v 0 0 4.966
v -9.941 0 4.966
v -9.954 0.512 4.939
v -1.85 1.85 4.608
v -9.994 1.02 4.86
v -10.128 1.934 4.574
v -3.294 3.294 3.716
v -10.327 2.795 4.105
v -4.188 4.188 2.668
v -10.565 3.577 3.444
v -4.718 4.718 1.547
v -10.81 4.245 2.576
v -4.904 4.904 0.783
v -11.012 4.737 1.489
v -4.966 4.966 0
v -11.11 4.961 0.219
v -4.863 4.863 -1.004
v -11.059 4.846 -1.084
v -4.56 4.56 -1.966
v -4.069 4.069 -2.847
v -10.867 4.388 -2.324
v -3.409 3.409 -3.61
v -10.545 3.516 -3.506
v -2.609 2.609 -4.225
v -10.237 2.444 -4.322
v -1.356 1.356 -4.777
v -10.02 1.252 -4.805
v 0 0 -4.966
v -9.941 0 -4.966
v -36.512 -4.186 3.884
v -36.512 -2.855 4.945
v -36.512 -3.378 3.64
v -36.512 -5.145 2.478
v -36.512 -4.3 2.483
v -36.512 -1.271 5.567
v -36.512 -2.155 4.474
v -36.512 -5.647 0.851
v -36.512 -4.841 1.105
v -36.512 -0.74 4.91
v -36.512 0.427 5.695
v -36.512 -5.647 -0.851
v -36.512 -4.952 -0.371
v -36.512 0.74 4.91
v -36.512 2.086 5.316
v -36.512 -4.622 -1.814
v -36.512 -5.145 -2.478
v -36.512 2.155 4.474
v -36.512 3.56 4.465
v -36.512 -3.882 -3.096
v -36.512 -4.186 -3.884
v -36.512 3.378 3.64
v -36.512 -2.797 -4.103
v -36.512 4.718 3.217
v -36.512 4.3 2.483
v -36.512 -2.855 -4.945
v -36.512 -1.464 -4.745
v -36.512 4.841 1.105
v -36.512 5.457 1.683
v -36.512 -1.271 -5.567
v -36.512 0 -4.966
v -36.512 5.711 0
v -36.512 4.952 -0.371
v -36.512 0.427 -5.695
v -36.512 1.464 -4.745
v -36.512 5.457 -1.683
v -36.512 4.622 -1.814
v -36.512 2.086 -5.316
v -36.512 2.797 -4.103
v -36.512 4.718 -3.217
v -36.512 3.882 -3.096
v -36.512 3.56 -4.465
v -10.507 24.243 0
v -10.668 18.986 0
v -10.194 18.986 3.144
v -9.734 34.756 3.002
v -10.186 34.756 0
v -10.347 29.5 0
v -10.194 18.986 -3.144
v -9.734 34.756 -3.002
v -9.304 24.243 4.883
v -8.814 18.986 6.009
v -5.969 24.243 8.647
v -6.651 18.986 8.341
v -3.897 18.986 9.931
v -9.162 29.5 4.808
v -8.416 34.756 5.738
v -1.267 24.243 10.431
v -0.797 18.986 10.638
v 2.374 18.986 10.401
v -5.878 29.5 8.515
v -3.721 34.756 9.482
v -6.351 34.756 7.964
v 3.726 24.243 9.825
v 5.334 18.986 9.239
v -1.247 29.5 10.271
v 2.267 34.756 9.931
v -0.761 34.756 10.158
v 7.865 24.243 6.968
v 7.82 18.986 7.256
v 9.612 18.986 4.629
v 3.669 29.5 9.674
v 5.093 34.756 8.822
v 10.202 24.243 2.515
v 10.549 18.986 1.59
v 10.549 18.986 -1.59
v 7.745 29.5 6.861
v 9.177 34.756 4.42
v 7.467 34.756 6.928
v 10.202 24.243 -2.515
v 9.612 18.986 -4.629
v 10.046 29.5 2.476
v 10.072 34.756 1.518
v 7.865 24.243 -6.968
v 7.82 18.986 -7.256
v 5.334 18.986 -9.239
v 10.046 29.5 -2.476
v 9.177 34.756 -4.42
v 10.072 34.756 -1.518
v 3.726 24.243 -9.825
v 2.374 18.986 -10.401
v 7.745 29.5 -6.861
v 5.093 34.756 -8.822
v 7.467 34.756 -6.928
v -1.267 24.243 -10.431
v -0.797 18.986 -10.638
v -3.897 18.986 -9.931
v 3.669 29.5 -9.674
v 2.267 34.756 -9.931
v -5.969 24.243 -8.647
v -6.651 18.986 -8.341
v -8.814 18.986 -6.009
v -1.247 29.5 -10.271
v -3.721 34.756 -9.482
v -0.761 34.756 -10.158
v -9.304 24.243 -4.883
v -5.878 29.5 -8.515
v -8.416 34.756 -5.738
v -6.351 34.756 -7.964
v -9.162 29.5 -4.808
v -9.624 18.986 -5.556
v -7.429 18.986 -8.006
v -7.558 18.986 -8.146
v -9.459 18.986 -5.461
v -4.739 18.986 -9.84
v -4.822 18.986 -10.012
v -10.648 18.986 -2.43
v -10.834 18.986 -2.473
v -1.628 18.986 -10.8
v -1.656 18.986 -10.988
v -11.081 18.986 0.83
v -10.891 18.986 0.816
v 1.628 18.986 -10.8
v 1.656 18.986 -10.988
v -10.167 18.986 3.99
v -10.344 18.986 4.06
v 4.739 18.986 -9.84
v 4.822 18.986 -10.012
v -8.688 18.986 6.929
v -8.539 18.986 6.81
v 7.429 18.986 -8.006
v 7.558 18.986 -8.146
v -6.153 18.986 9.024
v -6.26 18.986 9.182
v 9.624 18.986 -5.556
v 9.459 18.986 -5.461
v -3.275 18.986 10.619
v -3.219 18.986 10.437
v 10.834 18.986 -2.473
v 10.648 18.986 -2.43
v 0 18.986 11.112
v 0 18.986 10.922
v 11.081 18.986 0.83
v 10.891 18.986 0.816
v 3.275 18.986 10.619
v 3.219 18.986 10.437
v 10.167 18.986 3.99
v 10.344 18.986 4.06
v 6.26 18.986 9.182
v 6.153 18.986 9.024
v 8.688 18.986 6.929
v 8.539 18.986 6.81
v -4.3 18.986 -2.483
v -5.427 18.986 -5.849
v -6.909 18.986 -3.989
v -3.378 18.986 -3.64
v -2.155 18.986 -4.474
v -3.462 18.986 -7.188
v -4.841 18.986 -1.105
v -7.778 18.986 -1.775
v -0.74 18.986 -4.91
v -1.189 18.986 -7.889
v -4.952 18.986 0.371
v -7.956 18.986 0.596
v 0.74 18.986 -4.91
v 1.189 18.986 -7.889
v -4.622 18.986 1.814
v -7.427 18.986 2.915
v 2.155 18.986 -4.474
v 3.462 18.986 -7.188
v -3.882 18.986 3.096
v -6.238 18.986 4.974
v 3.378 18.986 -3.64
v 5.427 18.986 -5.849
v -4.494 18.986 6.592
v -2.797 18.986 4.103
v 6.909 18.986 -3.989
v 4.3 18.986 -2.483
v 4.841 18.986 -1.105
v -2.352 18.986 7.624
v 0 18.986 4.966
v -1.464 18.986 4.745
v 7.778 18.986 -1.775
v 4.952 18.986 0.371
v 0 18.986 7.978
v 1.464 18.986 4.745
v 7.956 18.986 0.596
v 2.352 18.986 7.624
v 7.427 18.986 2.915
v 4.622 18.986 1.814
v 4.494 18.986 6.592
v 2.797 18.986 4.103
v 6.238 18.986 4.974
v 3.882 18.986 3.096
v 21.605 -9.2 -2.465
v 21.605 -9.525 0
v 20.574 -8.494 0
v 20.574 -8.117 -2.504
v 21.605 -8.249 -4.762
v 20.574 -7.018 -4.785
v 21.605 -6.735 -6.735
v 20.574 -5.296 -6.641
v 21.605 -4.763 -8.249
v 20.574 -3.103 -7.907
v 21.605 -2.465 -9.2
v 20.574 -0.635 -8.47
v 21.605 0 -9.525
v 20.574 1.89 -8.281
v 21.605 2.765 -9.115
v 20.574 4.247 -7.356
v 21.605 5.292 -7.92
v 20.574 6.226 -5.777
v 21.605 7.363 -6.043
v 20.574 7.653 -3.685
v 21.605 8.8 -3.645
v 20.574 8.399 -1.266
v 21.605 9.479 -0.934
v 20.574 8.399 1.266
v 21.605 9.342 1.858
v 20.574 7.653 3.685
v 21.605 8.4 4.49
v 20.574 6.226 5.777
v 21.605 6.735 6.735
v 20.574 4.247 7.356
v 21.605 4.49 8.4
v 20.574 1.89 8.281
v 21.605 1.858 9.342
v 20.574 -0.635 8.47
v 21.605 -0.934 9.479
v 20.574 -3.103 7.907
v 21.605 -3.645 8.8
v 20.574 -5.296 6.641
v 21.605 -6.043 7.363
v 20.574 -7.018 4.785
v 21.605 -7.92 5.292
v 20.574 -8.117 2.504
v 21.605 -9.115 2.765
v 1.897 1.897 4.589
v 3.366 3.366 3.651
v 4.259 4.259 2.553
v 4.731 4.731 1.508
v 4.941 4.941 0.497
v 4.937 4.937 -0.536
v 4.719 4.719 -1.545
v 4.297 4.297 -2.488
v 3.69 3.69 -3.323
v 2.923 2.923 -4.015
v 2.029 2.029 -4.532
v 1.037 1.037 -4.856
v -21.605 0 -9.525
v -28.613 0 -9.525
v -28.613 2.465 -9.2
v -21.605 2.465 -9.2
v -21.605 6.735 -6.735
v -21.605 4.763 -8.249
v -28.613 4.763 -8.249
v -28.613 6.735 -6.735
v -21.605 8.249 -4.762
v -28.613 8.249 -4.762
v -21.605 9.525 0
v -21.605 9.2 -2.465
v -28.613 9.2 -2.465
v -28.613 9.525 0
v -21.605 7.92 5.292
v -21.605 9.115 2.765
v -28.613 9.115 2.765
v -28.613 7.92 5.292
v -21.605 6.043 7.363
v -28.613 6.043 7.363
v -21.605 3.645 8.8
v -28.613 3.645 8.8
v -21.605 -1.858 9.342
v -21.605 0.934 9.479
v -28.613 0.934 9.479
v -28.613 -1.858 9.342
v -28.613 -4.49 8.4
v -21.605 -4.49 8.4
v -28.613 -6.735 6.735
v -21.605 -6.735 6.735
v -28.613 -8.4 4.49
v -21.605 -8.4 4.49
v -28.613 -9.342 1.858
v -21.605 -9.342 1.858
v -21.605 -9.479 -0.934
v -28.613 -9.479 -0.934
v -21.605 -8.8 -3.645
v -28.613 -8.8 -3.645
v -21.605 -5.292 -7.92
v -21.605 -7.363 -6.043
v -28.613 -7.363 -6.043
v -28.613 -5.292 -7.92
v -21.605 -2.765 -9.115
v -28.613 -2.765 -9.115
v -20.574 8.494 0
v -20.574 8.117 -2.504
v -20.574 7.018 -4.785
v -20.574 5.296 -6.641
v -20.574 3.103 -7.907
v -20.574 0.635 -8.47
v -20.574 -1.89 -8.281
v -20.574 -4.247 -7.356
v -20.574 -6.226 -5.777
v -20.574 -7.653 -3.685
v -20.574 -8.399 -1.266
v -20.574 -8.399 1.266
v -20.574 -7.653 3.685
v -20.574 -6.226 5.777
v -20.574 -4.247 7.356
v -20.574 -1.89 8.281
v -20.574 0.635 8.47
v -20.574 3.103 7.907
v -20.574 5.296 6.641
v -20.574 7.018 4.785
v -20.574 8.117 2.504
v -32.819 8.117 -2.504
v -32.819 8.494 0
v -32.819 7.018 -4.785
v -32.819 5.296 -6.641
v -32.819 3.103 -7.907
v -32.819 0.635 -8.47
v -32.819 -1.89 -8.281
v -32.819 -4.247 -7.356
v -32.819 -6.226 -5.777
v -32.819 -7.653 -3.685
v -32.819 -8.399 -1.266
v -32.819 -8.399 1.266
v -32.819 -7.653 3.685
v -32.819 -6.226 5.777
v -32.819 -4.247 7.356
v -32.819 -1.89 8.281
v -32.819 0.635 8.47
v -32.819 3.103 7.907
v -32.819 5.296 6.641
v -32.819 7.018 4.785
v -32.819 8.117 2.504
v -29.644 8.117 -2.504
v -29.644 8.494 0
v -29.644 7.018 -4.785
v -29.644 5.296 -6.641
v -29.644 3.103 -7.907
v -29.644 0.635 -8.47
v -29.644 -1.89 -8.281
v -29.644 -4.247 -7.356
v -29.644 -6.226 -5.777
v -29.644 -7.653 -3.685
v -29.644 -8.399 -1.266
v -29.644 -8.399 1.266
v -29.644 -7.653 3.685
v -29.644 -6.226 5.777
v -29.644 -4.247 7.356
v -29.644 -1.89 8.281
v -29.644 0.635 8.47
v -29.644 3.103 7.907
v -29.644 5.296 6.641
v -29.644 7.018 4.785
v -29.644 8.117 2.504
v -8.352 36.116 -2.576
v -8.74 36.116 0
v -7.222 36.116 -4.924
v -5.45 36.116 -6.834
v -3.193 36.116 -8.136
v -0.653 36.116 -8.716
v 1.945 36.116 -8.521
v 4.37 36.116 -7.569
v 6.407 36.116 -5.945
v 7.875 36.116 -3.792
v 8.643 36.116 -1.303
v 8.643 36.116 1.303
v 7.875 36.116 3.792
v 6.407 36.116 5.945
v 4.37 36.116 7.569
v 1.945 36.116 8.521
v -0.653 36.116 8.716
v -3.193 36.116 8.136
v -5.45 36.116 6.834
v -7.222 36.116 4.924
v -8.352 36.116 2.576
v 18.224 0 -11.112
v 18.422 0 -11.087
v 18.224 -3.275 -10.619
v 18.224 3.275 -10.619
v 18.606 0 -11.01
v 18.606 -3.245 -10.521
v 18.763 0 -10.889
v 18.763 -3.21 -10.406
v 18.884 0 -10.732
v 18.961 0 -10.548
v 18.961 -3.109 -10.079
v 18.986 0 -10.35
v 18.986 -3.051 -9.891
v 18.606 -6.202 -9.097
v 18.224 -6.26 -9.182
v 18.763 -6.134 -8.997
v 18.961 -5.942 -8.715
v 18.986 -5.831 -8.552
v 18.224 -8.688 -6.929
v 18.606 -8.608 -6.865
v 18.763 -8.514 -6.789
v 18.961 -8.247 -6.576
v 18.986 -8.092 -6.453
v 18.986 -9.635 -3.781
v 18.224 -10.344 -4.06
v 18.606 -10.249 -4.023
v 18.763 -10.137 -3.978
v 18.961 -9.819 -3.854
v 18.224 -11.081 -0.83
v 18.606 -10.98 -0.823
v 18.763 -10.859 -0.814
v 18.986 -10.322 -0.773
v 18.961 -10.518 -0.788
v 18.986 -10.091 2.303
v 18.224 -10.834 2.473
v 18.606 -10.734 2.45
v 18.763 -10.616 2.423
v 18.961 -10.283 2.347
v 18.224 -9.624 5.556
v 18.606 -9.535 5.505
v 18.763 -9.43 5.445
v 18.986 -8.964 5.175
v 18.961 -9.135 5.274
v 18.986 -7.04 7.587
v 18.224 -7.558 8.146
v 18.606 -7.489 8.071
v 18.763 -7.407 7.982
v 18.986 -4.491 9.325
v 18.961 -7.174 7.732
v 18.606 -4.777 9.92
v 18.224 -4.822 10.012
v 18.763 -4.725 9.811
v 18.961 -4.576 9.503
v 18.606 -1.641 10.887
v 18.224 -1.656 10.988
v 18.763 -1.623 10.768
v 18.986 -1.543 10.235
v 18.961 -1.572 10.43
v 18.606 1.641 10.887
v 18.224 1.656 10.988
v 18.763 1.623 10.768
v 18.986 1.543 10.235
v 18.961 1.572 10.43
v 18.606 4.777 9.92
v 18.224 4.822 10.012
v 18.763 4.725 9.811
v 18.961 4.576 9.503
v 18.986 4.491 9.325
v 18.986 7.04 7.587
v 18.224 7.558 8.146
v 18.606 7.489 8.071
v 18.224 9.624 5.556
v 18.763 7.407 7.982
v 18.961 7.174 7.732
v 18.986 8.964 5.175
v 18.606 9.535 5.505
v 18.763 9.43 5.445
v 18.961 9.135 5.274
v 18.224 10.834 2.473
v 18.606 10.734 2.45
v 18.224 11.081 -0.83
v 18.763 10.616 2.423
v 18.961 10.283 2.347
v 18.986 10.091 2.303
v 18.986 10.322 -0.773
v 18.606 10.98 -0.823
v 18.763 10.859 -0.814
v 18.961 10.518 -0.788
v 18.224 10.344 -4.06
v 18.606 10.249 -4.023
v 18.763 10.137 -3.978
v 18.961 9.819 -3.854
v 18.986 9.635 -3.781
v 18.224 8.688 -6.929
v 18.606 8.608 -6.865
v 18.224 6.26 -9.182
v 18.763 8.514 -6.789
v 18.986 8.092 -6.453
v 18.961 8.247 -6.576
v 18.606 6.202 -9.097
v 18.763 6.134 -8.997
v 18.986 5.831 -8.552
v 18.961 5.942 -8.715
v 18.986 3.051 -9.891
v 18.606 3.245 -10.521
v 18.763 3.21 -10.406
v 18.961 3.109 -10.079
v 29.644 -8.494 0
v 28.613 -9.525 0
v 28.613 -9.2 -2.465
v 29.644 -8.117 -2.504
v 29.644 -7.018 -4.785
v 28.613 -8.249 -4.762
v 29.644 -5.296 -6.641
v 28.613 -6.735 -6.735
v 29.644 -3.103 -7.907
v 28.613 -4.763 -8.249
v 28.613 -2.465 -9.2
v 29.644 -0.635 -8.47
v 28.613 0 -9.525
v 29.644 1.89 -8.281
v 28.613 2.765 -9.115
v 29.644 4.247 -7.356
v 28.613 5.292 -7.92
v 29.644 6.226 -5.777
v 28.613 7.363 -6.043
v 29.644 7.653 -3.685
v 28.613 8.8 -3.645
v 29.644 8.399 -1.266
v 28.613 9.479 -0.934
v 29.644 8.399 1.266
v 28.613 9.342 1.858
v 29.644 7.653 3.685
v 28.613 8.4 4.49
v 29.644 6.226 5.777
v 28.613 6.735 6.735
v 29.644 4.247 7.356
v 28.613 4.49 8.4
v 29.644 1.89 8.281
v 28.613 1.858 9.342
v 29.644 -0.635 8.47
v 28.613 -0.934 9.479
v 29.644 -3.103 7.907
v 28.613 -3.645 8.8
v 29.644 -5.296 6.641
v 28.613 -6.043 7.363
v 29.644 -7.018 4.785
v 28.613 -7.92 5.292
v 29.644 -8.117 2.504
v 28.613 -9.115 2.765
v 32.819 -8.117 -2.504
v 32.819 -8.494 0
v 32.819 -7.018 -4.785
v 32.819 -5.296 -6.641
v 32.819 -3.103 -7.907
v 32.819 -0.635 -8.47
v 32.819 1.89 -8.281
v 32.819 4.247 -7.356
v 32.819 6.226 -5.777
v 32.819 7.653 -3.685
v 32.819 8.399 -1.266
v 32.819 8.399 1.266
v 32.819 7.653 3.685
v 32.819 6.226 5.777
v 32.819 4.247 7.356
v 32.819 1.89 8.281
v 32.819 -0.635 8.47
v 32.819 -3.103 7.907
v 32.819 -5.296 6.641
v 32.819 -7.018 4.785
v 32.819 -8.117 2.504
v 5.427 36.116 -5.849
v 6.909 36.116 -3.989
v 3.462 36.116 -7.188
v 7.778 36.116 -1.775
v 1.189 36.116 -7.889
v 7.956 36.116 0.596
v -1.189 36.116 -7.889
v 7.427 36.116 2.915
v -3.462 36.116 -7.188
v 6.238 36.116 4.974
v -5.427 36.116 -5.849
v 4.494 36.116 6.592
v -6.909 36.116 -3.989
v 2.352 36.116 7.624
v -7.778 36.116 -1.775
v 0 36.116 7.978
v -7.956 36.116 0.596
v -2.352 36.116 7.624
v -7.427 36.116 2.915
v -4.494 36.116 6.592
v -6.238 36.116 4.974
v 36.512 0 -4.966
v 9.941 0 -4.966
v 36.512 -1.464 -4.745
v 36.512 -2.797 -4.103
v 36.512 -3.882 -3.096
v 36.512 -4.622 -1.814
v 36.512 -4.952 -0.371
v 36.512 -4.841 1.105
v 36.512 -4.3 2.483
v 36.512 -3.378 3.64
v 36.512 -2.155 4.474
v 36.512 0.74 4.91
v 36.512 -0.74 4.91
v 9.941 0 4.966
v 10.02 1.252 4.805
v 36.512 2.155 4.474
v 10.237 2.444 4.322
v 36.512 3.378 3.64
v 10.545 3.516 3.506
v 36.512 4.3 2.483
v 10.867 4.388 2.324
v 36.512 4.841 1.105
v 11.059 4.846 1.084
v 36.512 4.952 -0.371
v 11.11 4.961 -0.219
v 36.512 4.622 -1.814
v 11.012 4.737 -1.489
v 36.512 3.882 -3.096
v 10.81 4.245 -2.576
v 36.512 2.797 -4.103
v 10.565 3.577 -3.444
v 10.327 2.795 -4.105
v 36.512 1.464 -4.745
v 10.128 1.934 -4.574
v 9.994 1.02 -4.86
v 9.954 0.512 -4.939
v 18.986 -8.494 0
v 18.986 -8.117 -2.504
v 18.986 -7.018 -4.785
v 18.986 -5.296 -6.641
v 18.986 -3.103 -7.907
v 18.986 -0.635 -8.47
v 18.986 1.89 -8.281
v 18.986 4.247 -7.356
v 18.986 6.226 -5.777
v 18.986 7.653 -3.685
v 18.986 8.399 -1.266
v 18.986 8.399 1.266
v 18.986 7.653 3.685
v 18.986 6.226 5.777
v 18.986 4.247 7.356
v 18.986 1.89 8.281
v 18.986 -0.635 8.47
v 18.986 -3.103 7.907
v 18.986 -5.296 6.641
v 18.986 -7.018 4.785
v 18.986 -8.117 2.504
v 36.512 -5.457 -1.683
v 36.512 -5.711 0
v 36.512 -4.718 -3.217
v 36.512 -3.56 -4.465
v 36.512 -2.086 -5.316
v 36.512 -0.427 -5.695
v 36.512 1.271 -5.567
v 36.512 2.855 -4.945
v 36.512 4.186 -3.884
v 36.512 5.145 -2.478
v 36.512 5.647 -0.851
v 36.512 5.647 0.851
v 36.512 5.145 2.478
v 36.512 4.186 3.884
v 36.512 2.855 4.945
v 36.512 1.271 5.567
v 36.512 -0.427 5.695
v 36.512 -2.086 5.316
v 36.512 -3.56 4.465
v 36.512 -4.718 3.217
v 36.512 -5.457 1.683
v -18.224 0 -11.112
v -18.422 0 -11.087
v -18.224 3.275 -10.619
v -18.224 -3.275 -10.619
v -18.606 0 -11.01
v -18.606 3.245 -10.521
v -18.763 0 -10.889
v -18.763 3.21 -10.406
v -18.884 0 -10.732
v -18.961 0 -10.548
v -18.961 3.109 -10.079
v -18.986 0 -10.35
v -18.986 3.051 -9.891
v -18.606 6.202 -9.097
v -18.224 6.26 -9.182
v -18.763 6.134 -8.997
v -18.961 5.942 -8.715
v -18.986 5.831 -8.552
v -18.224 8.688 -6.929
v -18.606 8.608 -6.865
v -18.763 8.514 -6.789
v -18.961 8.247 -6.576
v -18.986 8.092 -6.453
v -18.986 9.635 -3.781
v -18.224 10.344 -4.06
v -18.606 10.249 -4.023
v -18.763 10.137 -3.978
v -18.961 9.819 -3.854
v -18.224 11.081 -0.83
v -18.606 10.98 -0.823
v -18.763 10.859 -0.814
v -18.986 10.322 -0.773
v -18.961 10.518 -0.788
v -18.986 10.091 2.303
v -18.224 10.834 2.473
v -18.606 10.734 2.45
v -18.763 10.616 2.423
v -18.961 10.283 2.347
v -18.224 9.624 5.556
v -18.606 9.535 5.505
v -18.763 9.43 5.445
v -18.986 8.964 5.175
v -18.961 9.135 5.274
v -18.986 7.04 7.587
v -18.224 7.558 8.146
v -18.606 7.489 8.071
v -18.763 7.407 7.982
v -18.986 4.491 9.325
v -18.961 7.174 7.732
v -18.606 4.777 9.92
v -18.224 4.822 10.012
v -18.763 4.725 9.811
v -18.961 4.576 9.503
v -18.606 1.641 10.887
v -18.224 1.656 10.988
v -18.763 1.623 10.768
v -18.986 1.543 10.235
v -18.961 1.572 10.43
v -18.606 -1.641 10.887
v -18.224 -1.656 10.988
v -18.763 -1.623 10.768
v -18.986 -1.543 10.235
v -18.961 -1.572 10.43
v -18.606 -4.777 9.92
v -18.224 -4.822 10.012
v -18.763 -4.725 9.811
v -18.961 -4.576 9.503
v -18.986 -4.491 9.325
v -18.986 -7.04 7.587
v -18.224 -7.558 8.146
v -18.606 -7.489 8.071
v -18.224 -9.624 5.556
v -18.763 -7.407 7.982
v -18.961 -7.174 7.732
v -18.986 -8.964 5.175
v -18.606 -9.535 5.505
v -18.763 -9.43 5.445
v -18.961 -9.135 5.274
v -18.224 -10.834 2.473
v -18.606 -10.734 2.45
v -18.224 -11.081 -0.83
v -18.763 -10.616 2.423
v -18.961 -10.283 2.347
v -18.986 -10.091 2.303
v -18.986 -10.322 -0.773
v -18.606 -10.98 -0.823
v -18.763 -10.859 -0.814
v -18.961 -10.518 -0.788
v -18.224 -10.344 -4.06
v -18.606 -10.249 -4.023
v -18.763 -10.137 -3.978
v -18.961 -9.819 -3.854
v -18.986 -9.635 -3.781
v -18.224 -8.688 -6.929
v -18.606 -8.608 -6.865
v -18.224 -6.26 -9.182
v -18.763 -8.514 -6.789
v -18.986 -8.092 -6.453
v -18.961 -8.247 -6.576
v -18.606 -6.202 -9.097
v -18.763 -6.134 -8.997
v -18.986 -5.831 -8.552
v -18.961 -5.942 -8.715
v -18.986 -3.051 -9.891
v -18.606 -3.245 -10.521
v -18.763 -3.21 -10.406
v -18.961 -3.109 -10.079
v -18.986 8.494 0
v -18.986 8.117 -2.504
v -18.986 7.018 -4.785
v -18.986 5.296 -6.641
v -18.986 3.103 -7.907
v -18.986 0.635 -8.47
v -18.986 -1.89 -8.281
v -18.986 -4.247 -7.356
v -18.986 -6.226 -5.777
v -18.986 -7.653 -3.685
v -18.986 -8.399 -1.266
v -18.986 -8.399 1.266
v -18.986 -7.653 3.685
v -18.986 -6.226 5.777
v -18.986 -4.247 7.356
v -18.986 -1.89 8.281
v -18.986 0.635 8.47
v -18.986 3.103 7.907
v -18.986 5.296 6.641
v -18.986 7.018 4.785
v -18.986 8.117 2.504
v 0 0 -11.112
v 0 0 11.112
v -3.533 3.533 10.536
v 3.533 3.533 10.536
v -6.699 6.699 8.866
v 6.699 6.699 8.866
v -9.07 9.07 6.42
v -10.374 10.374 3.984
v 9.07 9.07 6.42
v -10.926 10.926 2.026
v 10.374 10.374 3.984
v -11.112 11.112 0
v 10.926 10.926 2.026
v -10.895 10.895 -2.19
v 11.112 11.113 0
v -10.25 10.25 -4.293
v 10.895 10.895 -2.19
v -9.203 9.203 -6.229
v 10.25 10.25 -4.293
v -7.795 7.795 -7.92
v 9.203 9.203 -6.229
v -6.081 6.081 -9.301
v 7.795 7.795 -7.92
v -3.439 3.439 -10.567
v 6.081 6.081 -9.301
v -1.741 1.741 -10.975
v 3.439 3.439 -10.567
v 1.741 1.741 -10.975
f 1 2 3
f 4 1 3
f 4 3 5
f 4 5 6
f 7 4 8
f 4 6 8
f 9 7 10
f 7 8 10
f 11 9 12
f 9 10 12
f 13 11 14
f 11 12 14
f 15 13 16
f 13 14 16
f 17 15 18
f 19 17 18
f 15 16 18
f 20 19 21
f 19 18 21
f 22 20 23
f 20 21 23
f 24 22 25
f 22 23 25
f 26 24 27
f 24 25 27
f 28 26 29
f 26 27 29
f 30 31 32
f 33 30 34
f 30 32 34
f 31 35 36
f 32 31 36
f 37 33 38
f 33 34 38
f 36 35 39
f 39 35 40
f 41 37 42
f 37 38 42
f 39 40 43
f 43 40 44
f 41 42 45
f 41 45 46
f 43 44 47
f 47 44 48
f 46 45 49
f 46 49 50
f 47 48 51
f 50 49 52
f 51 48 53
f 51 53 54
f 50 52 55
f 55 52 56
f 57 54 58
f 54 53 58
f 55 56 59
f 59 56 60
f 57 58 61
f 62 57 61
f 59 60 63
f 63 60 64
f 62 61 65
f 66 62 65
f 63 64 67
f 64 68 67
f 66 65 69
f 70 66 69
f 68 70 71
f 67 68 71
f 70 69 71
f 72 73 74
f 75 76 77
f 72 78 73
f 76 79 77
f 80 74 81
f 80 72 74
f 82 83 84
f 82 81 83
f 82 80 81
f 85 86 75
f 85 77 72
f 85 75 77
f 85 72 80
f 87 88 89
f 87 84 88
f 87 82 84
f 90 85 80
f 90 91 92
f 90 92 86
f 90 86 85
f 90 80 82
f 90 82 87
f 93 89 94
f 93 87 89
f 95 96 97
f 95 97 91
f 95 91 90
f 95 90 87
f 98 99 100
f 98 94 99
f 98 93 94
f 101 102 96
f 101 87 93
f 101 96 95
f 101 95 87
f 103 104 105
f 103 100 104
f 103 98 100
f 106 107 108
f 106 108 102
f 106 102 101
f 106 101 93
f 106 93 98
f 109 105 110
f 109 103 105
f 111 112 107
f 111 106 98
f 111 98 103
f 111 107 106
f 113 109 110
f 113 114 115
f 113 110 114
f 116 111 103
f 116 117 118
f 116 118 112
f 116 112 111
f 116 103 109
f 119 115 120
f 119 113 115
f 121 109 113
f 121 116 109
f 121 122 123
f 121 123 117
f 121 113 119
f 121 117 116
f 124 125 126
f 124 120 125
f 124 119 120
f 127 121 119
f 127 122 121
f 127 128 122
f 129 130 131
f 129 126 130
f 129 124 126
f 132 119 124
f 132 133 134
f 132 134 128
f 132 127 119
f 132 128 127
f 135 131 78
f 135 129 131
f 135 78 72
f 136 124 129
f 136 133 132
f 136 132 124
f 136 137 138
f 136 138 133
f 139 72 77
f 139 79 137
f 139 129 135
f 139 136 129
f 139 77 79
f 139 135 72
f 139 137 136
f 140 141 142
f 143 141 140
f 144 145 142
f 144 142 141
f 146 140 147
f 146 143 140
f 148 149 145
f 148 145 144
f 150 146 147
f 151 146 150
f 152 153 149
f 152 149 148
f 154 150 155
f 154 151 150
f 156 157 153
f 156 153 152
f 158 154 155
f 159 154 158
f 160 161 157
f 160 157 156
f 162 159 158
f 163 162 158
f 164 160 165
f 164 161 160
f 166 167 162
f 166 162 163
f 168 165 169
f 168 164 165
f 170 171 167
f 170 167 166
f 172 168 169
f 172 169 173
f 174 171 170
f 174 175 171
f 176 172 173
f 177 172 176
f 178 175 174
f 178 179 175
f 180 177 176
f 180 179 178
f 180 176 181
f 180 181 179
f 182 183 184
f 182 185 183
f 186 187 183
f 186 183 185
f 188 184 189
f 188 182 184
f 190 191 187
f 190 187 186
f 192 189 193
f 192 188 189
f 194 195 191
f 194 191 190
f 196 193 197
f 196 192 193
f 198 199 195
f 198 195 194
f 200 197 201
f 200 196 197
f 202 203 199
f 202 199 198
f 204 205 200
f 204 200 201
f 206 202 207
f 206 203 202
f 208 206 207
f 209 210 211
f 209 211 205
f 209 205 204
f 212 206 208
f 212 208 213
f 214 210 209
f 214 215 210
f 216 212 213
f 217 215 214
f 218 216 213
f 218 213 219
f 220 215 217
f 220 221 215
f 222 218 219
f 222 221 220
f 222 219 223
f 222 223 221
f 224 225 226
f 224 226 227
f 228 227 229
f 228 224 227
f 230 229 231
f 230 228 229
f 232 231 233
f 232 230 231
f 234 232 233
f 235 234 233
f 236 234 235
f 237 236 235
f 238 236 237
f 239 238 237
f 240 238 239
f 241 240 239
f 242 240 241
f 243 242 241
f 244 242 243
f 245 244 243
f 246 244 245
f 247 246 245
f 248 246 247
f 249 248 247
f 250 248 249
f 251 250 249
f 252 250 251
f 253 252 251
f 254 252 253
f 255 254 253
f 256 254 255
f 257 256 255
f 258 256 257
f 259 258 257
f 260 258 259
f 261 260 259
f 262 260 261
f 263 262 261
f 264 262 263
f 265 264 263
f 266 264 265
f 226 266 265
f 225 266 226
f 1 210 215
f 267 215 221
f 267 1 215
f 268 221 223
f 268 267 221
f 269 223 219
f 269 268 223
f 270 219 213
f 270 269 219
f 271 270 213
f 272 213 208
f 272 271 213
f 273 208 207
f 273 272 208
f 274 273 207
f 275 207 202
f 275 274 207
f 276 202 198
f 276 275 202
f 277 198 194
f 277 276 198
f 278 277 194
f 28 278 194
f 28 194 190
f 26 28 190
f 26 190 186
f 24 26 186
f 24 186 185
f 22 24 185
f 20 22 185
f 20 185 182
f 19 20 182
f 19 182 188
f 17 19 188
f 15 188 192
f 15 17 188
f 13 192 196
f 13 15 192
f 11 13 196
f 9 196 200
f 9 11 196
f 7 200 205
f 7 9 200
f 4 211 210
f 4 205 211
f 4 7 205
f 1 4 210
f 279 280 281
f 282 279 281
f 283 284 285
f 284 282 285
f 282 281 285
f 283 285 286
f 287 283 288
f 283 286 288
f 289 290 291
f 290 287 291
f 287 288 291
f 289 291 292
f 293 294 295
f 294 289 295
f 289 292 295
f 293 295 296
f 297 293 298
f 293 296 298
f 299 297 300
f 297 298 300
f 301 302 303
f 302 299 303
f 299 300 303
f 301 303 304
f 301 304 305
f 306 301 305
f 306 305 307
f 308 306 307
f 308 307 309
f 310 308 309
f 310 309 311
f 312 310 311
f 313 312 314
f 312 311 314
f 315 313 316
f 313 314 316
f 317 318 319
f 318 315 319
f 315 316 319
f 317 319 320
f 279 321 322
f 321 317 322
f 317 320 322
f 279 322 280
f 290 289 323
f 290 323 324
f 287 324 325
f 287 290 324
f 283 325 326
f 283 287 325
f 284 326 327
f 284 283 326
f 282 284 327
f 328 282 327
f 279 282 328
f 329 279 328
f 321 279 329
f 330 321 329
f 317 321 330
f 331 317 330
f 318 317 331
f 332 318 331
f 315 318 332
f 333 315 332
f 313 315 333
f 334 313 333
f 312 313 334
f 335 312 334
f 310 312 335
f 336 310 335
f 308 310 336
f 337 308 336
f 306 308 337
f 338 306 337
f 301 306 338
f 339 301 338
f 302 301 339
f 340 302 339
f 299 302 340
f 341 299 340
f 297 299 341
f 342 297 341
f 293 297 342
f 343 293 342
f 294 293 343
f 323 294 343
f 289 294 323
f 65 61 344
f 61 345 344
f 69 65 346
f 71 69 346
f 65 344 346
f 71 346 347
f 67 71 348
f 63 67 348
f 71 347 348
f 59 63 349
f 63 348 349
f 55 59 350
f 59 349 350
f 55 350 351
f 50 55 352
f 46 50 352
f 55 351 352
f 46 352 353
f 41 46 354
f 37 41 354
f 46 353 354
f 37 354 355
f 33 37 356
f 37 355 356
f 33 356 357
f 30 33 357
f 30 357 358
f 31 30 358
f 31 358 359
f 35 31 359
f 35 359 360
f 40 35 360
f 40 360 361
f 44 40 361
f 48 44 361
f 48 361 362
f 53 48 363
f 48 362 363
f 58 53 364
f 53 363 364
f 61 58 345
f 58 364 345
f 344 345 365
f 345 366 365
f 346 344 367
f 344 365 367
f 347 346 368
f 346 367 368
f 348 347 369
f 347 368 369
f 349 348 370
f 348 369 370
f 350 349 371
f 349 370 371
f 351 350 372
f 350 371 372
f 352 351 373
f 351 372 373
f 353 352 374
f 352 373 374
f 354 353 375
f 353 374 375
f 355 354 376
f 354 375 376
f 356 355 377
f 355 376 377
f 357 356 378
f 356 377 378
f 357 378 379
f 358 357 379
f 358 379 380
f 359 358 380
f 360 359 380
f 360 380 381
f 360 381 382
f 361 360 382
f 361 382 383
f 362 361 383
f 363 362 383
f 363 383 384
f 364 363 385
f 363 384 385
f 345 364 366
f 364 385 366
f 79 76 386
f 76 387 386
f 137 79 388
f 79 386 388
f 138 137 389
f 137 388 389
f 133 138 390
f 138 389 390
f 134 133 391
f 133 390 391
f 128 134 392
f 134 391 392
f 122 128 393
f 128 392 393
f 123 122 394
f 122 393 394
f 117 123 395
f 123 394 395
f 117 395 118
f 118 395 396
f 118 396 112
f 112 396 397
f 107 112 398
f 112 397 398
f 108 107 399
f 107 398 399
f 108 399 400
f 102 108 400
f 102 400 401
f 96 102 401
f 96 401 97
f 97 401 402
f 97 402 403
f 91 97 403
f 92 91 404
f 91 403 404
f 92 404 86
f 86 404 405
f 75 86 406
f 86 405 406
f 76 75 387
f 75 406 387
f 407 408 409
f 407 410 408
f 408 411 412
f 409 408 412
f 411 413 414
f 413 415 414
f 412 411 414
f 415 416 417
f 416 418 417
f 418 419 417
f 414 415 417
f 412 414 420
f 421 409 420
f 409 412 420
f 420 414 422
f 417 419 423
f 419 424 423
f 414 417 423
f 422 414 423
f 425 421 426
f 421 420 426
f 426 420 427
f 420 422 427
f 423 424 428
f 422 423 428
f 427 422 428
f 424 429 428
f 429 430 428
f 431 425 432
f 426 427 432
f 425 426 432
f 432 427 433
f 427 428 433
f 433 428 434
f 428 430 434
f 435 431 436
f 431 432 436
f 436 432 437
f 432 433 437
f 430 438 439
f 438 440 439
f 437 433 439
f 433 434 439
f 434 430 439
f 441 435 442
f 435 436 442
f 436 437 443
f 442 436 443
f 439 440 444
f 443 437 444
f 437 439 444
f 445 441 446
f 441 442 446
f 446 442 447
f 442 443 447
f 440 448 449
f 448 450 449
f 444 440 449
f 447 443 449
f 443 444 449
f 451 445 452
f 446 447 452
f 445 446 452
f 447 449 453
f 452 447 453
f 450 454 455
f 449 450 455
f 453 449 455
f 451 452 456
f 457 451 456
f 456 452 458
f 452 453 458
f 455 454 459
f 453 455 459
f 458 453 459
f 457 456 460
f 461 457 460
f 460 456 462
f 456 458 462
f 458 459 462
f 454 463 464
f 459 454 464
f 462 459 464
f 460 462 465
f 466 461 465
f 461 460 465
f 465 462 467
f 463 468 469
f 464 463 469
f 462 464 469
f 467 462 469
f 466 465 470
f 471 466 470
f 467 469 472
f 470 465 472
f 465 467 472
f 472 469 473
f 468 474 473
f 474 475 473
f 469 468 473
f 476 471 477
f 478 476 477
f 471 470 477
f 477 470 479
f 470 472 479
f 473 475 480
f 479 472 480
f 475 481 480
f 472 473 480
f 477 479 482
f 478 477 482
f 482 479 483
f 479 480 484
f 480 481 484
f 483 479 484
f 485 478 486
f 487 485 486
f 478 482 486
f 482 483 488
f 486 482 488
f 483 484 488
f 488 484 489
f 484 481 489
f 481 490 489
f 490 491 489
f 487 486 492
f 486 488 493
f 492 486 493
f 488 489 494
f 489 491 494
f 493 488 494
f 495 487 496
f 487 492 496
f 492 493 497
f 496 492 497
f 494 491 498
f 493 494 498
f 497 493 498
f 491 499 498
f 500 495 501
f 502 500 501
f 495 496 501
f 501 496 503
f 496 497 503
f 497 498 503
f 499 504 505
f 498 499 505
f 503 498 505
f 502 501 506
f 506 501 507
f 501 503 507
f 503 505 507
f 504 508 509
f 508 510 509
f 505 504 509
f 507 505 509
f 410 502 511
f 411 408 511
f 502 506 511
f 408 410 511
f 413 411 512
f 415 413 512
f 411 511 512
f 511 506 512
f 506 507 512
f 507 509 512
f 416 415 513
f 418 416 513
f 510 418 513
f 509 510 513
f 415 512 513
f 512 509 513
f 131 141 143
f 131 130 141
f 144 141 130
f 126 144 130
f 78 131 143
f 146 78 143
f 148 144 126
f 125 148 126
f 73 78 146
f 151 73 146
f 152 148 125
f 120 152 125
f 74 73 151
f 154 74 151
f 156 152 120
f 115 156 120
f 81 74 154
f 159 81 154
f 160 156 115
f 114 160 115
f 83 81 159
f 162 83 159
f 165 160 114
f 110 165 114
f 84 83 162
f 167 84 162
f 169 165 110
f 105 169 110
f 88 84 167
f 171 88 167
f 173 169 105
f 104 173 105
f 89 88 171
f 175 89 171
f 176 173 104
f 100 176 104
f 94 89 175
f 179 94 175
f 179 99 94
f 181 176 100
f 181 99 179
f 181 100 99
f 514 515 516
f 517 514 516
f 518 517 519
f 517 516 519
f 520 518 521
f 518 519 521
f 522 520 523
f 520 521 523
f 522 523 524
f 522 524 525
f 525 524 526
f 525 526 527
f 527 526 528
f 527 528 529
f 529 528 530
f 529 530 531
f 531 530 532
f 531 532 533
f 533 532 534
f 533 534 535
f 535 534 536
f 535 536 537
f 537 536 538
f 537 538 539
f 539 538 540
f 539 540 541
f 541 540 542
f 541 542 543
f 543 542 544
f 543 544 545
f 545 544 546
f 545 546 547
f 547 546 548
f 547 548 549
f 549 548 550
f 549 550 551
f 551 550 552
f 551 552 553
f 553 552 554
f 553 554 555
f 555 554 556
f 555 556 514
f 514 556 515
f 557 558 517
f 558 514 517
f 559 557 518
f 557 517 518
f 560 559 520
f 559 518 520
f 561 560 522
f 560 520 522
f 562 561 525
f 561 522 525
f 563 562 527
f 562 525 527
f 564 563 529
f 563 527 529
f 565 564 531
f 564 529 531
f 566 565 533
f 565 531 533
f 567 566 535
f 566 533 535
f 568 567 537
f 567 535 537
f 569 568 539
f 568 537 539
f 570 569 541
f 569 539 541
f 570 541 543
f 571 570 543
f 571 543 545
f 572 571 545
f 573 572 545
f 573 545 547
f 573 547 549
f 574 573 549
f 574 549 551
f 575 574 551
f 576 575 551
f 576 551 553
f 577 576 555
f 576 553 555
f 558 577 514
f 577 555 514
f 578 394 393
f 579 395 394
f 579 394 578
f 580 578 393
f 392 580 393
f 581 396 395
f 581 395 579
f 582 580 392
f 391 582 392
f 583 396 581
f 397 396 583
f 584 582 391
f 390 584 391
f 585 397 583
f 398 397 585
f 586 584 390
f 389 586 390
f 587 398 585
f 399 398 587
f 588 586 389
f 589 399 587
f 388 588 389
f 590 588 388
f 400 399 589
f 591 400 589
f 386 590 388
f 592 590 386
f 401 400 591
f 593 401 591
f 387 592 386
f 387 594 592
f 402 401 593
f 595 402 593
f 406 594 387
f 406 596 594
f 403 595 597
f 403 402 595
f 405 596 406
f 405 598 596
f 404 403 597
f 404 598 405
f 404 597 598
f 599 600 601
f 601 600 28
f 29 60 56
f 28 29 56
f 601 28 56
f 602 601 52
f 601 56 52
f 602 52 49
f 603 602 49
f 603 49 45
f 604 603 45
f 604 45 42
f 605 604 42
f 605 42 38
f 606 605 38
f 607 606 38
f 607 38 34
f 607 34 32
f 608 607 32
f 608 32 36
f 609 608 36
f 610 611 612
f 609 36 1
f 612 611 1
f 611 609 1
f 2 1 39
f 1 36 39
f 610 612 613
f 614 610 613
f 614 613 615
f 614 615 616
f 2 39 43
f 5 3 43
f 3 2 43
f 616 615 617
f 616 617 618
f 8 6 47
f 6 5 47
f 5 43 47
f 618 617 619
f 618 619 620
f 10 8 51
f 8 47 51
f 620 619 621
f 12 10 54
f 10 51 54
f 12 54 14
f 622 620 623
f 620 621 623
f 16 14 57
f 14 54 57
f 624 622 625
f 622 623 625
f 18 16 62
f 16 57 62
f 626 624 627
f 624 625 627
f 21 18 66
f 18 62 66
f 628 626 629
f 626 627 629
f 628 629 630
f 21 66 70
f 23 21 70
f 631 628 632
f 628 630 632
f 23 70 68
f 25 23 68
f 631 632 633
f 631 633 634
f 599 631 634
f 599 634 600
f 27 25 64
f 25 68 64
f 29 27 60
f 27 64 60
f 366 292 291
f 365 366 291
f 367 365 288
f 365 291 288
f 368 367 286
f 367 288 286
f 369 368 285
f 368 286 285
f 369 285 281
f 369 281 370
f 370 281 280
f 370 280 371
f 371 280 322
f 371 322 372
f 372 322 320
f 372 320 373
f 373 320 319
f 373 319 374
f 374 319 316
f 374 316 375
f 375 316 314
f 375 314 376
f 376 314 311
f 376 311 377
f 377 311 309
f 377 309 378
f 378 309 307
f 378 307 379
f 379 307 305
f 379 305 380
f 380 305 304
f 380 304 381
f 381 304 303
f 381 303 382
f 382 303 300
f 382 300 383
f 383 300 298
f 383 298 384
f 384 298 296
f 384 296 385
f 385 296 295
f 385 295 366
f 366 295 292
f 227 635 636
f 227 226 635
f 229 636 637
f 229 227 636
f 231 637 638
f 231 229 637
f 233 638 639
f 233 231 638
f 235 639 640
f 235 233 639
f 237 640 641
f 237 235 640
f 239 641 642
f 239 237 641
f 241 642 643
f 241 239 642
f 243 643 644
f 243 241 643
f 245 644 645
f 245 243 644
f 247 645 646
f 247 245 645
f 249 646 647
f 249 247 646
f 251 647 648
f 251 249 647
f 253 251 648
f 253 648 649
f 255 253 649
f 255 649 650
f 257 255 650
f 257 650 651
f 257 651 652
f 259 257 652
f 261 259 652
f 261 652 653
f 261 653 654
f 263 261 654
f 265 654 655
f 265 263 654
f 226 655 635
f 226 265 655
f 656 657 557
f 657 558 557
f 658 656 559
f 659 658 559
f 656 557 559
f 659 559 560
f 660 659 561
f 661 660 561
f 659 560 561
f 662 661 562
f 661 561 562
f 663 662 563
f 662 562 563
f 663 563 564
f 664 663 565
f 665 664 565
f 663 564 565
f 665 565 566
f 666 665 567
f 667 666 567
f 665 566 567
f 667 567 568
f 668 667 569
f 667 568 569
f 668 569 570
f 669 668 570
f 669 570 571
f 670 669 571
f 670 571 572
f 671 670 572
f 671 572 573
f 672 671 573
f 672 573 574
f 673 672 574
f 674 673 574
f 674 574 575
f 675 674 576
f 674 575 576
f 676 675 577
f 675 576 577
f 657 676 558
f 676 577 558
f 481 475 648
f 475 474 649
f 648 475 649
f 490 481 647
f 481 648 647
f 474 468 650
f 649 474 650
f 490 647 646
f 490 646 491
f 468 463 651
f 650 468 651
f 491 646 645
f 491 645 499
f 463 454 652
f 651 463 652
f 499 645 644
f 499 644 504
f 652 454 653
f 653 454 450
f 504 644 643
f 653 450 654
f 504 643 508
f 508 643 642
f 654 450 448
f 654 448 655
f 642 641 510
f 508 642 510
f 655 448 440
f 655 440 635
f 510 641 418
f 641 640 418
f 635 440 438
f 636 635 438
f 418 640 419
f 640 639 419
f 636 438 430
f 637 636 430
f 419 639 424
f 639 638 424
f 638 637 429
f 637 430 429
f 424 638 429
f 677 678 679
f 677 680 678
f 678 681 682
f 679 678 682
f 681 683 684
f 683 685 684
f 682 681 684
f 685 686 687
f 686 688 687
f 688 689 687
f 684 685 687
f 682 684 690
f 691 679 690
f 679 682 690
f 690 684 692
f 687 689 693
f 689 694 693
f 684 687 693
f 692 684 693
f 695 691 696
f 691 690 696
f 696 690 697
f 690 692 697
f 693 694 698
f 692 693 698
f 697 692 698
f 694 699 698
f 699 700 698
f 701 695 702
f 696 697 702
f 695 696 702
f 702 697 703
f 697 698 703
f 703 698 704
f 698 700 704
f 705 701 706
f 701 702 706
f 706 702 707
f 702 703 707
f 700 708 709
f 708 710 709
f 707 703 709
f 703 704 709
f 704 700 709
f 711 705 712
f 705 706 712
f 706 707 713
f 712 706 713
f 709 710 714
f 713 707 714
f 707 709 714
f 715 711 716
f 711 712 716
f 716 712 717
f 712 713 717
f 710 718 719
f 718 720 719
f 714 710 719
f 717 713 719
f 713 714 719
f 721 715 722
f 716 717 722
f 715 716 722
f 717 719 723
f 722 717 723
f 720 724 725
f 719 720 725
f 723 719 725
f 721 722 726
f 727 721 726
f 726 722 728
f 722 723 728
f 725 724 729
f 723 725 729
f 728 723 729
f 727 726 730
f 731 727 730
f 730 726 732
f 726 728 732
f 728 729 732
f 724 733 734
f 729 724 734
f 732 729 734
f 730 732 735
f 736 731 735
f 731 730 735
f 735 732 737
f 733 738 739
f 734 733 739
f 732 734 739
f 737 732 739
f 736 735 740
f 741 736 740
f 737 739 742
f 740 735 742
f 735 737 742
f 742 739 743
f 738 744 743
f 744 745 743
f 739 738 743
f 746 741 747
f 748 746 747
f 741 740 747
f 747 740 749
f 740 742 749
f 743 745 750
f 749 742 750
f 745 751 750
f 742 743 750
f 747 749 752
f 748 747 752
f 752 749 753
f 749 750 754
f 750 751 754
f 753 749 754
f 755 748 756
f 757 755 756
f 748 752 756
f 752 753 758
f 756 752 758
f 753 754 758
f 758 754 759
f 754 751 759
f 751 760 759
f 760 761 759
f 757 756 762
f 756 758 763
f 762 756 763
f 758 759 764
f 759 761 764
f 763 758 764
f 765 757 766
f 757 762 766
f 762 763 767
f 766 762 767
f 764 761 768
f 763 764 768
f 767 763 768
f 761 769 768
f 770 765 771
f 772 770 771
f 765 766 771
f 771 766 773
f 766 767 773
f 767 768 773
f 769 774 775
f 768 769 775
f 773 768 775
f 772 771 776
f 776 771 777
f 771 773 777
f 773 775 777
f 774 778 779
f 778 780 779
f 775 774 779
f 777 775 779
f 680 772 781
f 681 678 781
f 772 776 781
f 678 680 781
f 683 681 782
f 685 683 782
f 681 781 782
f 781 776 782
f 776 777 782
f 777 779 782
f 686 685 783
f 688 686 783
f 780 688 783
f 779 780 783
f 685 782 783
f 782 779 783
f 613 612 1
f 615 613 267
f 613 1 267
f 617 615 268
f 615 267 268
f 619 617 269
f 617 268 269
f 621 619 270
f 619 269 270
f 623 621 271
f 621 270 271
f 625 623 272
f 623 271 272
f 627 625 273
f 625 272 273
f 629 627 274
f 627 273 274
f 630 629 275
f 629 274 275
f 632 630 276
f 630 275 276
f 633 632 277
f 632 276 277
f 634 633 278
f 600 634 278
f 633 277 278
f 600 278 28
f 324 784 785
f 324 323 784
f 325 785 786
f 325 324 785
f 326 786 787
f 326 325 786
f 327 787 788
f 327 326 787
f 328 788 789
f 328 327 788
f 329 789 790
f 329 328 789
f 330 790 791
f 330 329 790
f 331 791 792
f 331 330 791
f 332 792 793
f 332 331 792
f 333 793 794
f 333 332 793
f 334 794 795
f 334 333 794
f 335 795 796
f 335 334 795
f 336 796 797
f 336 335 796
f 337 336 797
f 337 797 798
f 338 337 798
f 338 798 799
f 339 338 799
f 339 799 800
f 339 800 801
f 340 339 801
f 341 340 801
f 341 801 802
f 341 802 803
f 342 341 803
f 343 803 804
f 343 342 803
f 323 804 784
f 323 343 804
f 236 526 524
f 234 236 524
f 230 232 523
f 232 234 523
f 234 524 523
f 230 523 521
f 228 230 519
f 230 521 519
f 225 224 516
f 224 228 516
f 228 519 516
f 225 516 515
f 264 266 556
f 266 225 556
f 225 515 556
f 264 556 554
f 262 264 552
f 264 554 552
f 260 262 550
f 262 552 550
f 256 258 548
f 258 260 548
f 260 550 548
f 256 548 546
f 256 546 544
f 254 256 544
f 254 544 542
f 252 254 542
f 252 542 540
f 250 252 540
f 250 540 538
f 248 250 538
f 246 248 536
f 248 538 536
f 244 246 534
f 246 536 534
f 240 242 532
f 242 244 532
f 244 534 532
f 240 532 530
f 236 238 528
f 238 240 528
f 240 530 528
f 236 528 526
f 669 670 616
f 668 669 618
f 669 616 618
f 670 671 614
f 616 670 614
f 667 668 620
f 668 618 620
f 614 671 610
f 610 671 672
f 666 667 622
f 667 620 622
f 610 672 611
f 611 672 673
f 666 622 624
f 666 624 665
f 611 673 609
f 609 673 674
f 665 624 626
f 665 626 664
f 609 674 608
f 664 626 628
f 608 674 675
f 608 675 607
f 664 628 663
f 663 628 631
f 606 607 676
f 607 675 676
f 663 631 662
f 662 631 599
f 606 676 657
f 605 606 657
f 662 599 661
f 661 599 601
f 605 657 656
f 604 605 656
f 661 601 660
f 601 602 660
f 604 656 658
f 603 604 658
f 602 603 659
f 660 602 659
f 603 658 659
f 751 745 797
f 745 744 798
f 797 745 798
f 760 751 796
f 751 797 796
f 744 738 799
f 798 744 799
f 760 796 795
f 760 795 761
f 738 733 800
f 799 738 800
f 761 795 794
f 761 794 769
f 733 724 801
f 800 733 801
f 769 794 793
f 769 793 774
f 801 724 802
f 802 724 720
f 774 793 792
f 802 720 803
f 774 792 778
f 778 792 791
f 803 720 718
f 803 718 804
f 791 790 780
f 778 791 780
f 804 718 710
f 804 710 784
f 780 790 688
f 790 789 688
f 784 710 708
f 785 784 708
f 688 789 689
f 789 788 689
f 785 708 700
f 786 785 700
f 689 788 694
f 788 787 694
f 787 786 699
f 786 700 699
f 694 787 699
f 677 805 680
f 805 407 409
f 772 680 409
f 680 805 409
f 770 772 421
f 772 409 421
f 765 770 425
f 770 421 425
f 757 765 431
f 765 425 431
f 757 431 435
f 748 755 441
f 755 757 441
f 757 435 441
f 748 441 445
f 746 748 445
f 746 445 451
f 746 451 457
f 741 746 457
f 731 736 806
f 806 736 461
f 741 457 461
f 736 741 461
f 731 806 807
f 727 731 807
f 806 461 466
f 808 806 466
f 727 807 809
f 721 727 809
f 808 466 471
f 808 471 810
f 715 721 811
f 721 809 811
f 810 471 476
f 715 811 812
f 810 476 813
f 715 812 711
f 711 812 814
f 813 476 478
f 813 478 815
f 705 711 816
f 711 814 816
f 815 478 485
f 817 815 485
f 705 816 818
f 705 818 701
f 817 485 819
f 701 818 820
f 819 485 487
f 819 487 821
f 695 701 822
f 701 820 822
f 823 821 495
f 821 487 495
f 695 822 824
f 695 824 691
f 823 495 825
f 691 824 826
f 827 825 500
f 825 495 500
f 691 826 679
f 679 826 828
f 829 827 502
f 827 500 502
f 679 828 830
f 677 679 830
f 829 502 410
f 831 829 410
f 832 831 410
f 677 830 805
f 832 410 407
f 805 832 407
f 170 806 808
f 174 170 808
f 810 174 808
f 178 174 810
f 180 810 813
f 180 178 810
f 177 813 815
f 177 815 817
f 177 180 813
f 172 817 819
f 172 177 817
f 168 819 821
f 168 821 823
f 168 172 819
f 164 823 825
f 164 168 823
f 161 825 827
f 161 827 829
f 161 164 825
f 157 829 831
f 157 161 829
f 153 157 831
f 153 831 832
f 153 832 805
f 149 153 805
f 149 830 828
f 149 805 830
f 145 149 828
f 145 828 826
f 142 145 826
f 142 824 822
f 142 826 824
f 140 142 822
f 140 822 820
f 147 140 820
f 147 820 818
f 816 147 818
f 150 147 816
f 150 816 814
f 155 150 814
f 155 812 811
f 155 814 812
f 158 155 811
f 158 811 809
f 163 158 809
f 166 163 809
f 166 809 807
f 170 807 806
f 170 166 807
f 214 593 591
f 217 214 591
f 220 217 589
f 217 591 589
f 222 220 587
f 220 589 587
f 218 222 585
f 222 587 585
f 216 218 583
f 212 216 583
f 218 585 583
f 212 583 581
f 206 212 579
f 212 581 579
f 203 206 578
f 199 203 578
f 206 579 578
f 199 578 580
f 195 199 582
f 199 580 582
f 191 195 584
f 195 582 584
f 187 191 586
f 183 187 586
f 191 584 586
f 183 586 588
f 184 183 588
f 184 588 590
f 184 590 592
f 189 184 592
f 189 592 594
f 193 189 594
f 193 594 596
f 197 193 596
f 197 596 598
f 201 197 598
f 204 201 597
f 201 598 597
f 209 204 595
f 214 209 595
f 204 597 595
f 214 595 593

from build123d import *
from build123d.topology import SkipClean

# Parameters (mm, degrees)
SKETCH2_R           = 9.525
EXTRUDE1_DEPTH      = 17.526
SKETCH15_R          = 11.1125
BOSS_EXTRUDE1_DEPTH = 18.9865
SKETCH16_R          = 4.9657
CUT_EXTRUDE1_DEPTH  = 40.750949281
SKETCH20_R          = 11.1125
BOSS_EXTRUDE2_DEPTH = 18.9865
SKETCH22_R          = 10.668
BOSS_EXTRUDE3_DEPTH = 17.12976
BOSS_EXTRUDE3_TAPER = 1.75
CHAMFER1_SIZE       = 1.360714286
CHAMFER1_SIZE_2     = 1.404253042
SKETCH25_R          = 10.668
BOSS_EXTRUDE4_DEPTH = 17.12976
BOSS_EXTRUDE4_DRAFT = -15
SKETCH28_R          = 7.978385455
CUT_EXTRUDE6_DEPTH  = 17.12976
FILLET1_R           = 0.762
CIRPATTERN1_COUNT   = 2
CIRPATTERN1_ANGLE   = 180
SKETCH26_R          = 4.9657
CUT_EXTRUDE4_DEPTH  = 83.22239678
SKETCH29_R          = 4.9657
CUT_EXTRUDE7_DEPTH  = 53.545547444


with BuildPart() as part:
    # Sketch2 → Extrude1 (new body)
    with BuildSketch(Plane(origin=(-36.5125, 0, 0), x_dir=(0, 0, -1), z_dir=(1, 0, 0))):
        Circle(SKETCH2_R)
    extrude(amount=EXTRUDE1_DEPTH)

    # Sketch5 → Cut-Revolve1 (revolve, cut)
    with BuildSketch(Plane.XY):
        Polygon((-32.818891687, 8.493888504), (-29.643891687, 8.493888504), (-28.612780191, 9.525), (-36.5125, 9.525), (-36.5125, 5.710555), align=None)
        Polygon((-18.9865, 8.493888504), (-20.574, 8.493888504), (-21.605111496, 9.525), (-18.9865, 9.525), align=None)
    revolve(axis=Axis((0, 0, 0), (-1, 0, 0)), mode=Mode.SUBTRACT)

    # Sketch15 → Boss-Extrude1 (add)
    with BuildSketch(Plane(origin=(-18.9865, 0, 0), x_dir=(0, 0, -1), z_dir=(1, 0, 0))):
        Circle(SKETCH15_R)
    extrude(amount=BOSS_EXTRUDE1_DEPTH)

    # Sketch16 → Cut-Extrude1 (cut, through all)
    with BuildSketch(Plane(origin=(0, 0, 0), x_dir=(0, 0, -1), z_dir=(1, 0, 0))):
        Circle(SKETCH16_R)
    extrude(amount=-CUT_EXTRUDE1_DEPTH, mode=Mode.SUBTRACT)

    # Fillet1
    fillet1_edges = [part.edges().sort_by_distance(p)[0] for p in [
        (-18.9865, 0, 11.1125),
    ]]
    fillet(fillet1_edges, radius=FILLET1_R)


with BuildPart() as body_2:
    # Sketch20 → Boss-Extrude2 (new body)
    with BuildSketch(Plane(origin=(0, 18.9865, 0), x_dir=(-1, 0, 0), z_dir=(0, 1, 0))):
        with Locations(Location((0, 0, 0), (0, 0, 90))):
            Circle(SKETCH20_R)
    extrude(amount=-BOSS_EXTRUDE2_DEPTH)


with BuildPart() as body_3:
    # Sketch22 → Boss-Extrude3 (new body)
    with BuildSketch(Plane(origin=(0, 18.9865, 0), x_dir=(-1, 0, 0), z_dir=(0, 1, 0))):
        Circle(SKETCH22_R)
    extrude(amount=BOSS_EXTRUDE3_DEPTH, taper=BOSS_EXTRUDE3_TAPER)

    # Chamfer1
    # the kernel refuses this chamfer: 1.404253042, 1.360714286 mm, written as the material it takes off along each edge
    with BuildSketch(Plane(origin=(0, 36.11626, 0), x_dir=(-1, 0, 0), z_dir=(0, 0, 1))) as chamfer1_piece_1:
        Polygon((10.144638497 + CHAMFER1_SIZE * 0.0305385132034, CHAMFER1_SIZE * 0.999533590627), (10.144638497 - CHAMFER1_SIZE_2, 0), (10.144638497, 0), align=None)
    revolve(axis=Axis((0, 36.11626, 0), (0, -1, 0)), mode=Mode.SUBTRACT)


with BuildPart() as boss_extrude4_tool:
    # Sketch25 → Boss-Extrude4 (with draft: the straight prism first)
    with BuildSketch(Plane.XZ.offset(-18.9865)):
        Circle(SKETCH25_R)
    extrude(amount=-BOSS_EXTRUDE4_DEPTH)
    # Boss-Extrude4: the draft: its side faces are tilted about the plane it starts from
    boss_extrude4_sides = [boss_extrude4_tool.faces().sort_by_distance(p)[0] for p in [
        (-10.668, 27.55138, 0),
    ]]
    draft(boss_extrude4_sides, Plane.XZ.offset(-18.9865), BOSS_EXTRUDE4_DRAFT)


with BuildPart() as body_3_1:
    add(body_3.part)

    # Boss-Extrude4: add boss_extrude4_tool
    add(boss_extrude4_tool.part)

    # Sketch28 → Cut-Extrude6 (cut)
    with BuildSketch(Plane(origin=(0, 36.11626, 0), x_dir=(1, 0, 0), z_dir=(0, 1, 0))):
        with Locations(Location((0, 0, 0), (0, 0, 270))):
            Circle(SKETCH28_R)
    extrude(amount=-CUT_EXTRUDE6_DEPTH, mode=Mode.SUBTRACT)


with BuildPart() as cirpattern1_1:
    # CirPattern1: pattern copy
    add(part.part.rotate(Axis((0, 0, 12.651043997), (0, 0, -1)), 1 * CIRPATTERN1_ANGLE / (CIRPATTERN1_COUNT - 1)))


with BuildPart() as part_1:
    add(part.part)

    # Combine2: union body 3, body 2, CirPattern1_1
    add(body_3_1.part)
    add(body_2.part)
    add(cirpattern1_1.part)

    # Sketch30 → Revolve1 (revolve)
    with SkipClean():  # the faces are left unmerged after this step: merging them gives an invalid solid
        with BuildSketch(Plane.XY, mode=Mode.PRIVATE) as revolve1_sk:
            with BuildLine():
                Line((0, 18.9865), (0, 9.49325))
                ThreePointArc((0, 9.49325), (-5.981989992, 13.352586812), (-10.922, 18.4785))
                Line((-10.922, 18.4785), (-10.922, 18.9865))
                Line((-10.922, 18.9865), (0, 18.9865))
            make_face()
        revolve(revolve1_sk.sketch.rotate(Axis((0, 18.9865, 0), (0, -1, 0)), 270), axis=Axis((0, 18.9865, 0), (0, -1, 0)))

    # Sketch26 → Cut-Extrude4 (cut, through all)
    with SkipClean():  # the faces are left unmerged after this step: merging them gives an invalid solid
        with BuildSketch(Plane.ZY.offset(36.5125)):
            with Locations(Location((0, 0, 0), (0, 0, 180))):
                Circle(SKETCH26_R)
        extrude(amount=-CUT_EXTRUDE4_DEPTH, mode=Mode.SUBTRACT)

    # Sketch29 → Cut-Extrude7 (cut, through all)
    with SkipClean():  # the faces are left unmerged after this step: merging them gives an invalid solid
        with BuildSketch(Plane(origin=(0, 0, 0), x_dir=(1, 0, 0), z_dir=(0, 1, 0))):
            with Locations(Location((0, 0, 0), (0, 0, 270))):
                Circle(SKETCH29_R)
        extrude(amount=CUT_EXTRUDE7_DEPTH, mode=Mode.SUBTRACT)


solid = part_1.part
